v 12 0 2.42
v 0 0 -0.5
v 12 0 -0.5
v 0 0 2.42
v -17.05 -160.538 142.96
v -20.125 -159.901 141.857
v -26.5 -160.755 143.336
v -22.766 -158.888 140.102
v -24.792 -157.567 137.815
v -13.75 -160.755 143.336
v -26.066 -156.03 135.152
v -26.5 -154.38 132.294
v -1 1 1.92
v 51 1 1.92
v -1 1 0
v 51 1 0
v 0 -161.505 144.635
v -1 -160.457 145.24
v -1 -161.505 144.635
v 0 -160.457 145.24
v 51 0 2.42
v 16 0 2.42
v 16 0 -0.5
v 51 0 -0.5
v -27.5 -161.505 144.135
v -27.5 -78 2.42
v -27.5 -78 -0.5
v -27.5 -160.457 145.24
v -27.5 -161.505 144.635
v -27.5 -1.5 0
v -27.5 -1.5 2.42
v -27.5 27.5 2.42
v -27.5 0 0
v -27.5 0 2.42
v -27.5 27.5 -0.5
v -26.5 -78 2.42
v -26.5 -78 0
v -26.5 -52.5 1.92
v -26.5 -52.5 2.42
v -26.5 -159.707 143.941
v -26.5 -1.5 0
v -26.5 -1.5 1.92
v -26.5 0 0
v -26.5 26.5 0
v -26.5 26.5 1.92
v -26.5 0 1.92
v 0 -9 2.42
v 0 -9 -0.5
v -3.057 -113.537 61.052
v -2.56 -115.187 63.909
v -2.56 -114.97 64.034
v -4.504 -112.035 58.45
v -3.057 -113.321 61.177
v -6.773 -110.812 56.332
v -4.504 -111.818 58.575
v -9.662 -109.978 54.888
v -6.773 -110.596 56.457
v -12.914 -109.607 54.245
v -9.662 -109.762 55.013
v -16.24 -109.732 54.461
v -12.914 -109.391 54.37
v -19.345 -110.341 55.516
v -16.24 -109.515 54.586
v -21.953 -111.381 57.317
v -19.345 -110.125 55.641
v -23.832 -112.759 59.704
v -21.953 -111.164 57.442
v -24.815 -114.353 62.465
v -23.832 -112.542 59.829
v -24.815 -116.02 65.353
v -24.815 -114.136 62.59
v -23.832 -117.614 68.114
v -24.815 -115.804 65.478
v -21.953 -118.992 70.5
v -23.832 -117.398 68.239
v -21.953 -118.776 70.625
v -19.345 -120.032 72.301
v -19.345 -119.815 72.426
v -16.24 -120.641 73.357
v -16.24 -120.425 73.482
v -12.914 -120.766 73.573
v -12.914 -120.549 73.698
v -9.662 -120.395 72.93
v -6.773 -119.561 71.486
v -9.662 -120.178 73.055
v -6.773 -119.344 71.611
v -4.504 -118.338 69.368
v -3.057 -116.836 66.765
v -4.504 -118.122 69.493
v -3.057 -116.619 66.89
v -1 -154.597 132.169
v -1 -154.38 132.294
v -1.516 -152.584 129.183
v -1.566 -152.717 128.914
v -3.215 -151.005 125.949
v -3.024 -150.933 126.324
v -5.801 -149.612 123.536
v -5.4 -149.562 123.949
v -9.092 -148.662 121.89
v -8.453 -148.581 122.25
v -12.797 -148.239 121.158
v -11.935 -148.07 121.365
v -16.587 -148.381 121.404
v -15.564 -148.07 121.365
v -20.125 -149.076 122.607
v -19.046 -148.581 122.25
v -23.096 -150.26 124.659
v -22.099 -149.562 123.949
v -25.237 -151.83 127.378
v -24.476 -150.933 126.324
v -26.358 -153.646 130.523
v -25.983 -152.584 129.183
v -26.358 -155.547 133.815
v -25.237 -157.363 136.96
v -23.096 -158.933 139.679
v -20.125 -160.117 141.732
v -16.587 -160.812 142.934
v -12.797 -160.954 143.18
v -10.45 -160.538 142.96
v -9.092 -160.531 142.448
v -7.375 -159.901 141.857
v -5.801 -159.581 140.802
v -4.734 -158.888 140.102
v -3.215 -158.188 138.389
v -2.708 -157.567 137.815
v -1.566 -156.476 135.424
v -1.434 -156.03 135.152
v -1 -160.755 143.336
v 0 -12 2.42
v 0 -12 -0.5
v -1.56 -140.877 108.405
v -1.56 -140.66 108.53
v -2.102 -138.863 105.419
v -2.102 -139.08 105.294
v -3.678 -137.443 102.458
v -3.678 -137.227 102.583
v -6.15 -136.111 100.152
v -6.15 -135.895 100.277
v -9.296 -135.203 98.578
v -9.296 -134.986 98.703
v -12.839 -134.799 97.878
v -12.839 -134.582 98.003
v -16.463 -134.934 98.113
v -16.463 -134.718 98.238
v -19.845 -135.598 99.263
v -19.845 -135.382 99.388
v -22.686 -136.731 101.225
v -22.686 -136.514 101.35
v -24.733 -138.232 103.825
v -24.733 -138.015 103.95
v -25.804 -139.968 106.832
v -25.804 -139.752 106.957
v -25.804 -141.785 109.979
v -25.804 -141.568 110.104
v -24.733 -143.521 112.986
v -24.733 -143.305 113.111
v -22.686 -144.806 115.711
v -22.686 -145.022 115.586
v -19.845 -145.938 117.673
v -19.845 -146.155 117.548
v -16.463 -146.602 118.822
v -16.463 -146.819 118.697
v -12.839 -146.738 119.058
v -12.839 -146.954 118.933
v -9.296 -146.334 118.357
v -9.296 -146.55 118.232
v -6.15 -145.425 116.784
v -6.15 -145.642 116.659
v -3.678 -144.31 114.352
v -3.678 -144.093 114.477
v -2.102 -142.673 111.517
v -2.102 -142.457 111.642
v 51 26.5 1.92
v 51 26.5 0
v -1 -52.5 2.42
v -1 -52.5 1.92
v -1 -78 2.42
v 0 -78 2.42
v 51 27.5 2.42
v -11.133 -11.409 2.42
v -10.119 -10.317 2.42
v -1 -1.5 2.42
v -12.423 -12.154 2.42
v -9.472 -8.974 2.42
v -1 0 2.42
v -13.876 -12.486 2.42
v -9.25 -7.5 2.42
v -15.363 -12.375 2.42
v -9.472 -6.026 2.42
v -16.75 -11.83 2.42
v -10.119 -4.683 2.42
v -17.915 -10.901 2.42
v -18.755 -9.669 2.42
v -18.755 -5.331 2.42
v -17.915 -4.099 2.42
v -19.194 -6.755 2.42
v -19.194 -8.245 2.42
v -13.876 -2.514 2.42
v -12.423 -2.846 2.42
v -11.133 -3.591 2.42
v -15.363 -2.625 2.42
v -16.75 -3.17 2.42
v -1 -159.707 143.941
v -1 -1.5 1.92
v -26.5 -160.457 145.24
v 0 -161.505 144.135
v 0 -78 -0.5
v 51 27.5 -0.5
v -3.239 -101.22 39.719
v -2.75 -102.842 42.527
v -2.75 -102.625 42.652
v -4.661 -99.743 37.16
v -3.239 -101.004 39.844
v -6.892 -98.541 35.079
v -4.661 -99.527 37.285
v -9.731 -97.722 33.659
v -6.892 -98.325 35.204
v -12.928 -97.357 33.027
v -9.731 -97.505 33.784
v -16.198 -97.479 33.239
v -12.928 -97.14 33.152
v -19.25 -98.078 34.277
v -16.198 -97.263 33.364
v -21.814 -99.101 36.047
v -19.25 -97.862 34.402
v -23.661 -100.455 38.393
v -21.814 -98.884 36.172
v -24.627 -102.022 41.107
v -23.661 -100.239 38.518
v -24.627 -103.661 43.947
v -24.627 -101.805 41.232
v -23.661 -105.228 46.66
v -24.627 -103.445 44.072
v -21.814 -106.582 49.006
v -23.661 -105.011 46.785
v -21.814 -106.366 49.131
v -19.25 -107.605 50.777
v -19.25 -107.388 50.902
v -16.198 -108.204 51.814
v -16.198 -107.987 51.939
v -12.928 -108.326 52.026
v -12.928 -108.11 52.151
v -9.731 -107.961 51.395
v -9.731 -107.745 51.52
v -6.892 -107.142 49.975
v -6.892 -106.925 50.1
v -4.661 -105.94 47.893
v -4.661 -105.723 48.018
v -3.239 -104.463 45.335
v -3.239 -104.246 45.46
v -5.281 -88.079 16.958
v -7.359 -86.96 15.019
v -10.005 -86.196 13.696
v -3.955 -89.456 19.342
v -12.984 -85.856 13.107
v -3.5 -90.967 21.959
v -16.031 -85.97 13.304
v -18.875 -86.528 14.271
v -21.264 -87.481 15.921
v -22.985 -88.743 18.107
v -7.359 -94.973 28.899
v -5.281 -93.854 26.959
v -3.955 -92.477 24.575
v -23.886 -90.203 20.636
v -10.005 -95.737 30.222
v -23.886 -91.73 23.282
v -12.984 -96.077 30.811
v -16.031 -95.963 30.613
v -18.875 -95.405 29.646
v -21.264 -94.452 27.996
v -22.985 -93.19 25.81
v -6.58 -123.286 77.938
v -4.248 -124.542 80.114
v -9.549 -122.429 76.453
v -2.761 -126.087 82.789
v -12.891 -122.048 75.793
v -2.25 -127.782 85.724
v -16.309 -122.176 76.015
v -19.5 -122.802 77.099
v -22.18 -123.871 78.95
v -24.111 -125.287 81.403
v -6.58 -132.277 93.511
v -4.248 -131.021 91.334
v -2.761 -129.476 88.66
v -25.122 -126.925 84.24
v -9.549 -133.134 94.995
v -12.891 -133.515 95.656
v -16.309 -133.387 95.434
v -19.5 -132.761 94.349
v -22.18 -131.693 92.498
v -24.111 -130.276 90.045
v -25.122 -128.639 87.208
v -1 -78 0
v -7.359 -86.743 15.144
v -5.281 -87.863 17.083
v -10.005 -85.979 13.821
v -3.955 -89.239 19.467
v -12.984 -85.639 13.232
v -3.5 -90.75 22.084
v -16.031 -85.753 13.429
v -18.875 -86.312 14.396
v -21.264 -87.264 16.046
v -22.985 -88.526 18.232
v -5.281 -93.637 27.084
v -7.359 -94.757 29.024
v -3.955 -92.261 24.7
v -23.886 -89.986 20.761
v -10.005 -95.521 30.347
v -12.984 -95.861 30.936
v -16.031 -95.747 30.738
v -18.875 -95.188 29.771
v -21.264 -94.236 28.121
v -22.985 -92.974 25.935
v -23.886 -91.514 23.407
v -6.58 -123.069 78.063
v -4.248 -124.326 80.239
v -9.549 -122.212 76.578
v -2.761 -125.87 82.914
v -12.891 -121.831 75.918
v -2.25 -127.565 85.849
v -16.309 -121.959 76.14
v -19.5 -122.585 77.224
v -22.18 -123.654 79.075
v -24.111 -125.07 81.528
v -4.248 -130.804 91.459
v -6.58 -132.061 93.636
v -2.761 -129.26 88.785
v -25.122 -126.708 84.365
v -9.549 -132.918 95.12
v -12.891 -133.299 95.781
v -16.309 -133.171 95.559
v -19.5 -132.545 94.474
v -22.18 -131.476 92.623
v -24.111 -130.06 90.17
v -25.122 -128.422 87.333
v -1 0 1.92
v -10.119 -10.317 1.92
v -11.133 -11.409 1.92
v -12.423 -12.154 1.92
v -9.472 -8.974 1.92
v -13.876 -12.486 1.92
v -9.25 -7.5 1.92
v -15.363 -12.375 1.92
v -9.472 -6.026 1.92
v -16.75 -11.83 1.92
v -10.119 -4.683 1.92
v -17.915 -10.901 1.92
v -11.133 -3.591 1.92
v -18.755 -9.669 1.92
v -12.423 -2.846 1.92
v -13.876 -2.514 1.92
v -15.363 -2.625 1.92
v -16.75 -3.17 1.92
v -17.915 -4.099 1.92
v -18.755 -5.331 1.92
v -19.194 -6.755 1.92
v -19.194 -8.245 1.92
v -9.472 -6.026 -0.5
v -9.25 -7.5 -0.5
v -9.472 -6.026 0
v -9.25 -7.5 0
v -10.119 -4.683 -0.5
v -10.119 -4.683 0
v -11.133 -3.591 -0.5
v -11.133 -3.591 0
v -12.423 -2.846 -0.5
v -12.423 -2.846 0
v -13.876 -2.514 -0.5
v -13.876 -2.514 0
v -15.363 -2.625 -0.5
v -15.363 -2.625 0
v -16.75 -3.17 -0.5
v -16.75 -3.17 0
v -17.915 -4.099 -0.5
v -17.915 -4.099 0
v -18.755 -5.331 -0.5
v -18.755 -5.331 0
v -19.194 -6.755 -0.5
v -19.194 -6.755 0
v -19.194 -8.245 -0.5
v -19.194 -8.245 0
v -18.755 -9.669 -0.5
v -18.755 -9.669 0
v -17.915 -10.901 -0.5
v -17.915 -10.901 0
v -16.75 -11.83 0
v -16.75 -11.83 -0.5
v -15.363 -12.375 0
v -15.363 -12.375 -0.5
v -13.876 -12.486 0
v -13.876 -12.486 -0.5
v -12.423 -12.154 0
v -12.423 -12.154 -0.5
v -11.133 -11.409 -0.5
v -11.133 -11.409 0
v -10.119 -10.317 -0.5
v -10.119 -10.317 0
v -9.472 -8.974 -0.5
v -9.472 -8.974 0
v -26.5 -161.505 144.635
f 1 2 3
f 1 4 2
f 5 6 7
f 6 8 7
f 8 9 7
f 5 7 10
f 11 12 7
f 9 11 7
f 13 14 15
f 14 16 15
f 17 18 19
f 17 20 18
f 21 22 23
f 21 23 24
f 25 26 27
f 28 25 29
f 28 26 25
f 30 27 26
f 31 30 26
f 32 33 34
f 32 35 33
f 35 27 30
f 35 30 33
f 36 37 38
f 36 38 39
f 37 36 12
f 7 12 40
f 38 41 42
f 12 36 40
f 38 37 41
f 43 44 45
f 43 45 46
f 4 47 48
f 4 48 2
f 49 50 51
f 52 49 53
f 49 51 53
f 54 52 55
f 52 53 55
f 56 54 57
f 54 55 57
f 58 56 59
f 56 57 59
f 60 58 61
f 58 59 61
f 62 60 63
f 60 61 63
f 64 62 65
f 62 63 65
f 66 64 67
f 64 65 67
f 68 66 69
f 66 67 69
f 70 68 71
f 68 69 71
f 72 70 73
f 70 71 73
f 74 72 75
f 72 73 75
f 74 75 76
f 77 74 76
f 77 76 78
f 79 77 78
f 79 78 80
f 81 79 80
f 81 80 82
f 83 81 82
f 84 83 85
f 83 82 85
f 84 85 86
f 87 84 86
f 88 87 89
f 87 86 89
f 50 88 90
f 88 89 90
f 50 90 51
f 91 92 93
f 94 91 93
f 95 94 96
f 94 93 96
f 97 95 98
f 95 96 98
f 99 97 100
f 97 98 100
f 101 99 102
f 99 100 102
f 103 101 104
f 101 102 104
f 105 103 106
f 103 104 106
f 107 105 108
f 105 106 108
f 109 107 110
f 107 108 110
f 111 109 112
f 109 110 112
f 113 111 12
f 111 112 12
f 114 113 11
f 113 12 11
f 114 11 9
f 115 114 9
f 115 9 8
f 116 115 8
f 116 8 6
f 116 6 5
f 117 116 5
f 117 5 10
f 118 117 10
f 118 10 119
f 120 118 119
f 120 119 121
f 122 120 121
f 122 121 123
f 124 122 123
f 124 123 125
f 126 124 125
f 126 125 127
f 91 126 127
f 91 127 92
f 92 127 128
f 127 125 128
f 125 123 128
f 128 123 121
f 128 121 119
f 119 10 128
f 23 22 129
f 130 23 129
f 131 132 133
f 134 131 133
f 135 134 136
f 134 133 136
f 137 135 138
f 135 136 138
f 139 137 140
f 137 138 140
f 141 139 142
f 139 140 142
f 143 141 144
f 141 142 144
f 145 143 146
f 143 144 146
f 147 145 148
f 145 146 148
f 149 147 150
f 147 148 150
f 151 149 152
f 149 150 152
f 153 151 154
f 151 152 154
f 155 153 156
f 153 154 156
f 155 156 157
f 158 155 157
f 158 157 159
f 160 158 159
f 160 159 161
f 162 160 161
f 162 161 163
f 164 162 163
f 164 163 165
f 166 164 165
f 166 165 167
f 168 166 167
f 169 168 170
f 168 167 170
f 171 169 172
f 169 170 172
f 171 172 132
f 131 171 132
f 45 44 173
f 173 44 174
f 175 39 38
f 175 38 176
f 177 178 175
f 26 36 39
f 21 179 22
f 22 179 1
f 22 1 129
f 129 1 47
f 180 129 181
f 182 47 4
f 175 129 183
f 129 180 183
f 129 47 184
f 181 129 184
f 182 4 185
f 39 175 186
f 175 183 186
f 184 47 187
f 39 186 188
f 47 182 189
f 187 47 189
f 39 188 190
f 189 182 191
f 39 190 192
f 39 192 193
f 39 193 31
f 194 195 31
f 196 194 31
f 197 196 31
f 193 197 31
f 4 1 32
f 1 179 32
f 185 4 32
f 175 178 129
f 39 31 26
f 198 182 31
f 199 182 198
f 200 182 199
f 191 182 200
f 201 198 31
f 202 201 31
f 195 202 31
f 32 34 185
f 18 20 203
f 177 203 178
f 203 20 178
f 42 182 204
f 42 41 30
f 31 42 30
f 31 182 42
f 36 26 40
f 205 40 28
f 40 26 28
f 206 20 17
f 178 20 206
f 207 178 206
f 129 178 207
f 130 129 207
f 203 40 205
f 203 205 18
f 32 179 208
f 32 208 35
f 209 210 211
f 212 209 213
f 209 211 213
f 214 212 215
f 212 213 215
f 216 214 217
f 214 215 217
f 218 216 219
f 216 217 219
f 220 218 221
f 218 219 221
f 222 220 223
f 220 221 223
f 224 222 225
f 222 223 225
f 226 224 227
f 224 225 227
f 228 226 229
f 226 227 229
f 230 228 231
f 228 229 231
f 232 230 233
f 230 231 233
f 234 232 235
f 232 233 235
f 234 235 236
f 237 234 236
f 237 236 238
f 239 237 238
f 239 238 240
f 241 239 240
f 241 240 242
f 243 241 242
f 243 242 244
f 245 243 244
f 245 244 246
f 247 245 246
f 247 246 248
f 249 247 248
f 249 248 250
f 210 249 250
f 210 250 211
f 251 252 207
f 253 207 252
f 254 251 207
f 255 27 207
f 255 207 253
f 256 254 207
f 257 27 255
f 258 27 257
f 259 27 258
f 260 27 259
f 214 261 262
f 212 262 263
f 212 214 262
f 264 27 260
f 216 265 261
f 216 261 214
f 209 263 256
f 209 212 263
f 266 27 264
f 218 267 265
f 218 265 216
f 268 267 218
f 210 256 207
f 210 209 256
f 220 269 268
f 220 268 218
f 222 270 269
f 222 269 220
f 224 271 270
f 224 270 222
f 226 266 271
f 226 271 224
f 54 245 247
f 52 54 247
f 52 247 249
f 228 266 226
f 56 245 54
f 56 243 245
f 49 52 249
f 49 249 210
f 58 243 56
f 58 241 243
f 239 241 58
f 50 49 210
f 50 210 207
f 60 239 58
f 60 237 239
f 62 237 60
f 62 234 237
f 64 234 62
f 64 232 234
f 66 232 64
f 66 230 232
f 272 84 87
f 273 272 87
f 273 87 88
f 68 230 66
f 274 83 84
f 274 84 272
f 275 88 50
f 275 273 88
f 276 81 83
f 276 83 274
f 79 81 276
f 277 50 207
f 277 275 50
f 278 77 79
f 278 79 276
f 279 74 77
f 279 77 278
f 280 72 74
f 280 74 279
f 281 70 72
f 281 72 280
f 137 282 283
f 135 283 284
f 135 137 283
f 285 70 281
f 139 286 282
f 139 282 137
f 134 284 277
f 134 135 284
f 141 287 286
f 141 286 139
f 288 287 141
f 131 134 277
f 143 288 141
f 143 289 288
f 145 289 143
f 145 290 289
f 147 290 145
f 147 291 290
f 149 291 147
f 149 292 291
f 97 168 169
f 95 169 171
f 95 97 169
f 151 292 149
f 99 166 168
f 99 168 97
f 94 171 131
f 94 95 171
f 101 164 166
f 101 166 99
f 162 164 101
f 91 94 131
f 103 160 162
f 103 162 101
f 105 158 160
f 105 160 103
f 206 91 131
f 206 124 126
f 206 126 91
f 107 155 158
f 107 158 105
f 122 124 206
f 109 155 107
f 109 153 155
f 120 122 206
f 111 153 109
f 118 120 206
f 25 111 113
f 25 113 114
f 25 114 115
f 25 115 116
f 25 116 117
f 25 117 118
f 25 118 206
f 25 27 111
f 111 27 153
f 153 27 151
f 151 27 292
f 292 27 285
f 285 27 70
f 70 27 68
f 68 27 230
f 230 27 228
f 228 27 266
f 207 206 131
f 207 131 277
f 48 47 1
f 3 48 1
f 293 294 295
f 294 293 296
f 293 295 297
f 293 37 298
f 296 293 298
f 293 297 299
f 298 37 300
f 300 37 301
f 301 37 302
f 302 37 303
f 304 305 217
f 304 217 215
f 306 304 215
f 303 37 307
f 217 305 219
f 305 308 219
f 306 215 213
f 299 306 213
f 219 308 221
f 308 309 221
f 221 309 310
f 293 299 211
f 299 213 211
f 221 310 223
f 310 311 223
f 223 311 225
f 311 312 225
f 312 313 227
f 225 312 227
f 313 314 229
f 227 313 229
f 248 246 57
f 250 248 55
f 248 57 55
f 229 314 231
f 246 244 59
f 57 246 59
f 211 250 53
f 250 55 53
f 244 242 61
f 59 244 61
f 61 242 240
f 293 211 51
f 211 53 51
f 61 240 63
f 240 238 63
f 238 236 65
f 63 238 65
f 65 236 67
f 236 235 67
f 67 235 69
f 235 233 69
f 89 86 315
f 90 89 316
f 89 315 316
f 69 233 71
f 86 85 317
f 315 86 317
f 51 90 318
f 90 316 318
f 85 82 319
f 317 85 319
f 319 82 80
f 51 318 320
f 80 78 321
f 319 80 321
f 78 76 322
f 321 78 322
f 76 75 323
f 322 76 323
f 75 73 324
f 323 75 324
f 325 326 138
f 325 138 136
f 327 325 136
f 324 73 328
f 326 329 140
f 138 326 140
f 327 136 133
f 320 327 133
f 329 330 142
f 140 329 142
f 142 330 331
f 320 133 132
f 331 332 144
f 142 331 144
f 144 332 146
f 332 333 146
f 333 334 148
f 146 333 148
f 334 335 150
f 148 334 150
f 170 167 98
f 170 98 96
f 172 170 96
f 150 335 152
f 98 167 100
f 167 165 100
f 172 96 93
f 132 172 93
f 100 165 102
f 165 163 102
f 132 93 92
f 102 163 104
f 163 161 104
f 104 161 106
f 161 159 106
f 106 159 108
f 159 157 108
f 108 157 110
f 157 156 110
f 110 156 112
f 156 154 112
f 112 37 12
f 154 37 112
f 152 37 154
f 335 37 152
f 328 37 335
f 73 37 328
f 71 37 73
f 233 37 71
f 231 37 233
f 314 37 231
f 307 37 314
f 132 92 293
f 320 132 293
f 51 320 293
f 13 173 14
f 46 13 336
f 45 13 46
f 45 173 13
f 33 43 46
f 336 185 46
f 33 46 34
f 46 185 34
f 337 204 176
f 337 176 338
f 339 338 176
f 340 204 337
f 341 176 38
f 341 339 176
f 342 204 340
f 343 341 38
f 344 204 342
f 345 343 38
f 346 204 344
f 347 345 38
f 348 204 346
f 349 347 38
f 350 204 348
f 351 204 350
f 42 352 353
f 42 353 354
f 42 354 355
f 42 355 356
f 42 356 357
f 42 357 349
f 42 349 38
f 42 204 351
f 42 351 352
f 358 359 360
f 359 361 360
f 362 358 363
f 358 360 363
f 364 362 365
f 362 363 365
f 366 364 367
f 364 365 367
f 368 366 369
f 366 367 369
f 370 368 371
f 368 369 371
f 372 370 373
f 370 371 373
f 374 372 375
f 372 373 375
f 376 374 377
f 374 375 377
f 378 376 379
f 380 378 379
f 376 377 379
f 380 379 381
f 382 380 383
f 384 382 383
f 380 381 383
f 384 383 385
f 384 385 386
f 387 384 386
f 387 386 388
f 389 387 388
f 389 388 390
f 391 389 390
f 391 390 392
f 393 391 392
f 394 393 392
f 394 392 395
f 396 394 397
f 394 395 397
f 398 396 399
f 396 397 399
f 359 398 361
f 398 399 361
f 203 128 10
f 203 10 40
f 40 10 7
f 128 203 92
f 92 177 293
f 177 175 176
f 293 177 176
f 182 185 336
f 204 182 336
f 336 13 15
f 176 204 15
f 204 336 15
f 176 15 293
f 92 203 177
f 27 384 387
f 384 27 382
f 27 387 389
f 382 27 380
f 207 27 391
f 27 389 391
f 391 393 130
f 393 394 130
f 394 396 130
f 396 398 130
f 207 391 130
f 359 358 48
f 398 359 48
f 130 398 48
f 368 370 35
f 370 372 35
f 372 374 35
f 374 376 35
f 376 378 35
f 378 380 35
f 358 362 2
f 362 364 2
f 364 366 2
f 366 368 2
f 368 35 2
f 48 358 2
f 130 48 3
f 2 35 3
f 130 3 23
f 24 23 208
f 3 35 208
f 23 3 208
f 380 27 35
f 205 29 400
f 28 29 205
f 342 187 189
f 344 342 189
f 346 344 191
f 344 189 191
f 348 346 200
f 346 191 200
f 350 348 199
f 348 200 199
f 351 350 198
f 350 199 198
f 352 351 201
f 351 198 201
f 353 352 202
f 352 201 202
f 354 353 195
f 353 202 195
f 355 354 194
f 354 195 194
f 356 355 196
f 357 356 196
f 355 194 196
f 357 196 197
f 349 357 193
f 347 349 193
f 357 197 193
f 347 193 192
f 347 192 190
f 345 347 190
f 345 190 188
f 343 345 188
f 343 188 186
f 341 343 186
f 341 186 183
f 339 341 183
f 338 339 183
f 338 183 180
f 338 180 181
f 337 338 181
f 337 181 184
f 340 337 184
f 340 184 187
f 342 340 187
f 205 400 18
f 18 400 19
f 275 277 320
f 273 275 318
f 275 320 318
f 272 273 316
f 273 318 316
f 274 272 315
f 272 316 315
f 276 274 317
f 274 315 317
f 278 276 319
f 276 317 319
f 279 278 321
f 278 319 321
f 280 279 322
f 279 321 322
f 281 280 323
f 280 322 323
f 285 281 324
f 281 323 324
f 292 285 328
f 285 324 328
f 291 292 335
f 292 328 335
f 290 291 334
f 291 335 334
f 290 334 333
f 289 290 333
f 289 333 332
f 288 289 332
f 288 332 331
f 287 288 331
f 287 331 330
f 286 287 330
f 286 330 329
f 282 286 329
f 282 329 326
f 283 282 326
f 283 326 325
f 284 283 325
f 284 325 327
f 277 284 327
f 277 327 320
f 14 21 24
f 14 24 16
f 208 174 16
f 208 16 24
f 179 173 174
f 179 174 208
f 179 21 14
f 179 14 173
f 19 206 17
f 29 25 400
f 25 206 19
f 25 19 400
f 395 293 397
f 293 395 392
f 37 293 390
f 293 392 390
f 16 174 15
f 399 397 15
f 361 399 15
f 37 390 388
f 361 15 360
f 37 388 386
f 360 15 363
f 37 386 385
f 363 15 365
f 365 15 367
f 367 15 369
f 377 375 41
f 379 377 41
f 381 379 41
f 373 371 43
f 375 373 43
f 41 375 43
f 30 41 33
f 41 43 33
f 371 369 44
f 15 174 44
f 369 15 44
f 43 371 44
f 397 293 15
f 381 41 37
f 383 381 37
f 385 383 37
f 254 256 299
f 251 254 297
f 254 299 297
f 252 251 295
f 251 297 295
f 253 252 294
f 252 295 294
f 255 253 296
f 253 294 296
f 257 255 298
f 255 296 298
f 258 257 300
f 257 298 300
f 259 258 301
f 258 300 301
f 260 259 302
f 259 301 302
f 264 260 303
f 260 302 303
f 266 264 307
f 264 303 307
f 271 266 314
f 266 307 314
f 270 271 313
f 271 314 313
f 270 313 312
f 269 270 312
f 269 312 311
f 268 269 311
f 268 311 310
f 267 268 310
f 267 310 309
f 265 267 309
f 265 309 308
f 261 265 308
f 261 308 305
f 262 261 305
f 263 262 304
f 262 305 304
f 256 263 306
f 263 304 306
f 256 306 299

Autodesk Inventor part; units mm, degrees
ref_plane "YZ Plane" through (0, 0, 0) normal (1, 0, 0) x (0, 1, 0)
sketch "Boceto1" plane through (0, 0, 0) normal (0, 0, 1) x (1, 0, 0)
  line L0 (0, 0) -> (51, 0)
  line L1 (51, 0) -> (51, 27.5)
  line L2 (51, 27.5) -> (0, 27.5)
  line L3 (-0.5, 1) -> (51, 1)
  line L4 (0, 26.5) -> (51, 26.5)
  line L5 (0, 27.5) -> (-27.5, 27.5)
  line L6 (-27.5, 27.5) -> (-27.5, -52.5)
  line L7 (-27.5, -52.5) -> (0, -52.5)
  line L8 (0, -52.5) -> (0, 0)
  line L9 (0, 26.5) -> (-26.5, 26.5)
  line L10 (-0.5, 1) -> (-1, 1)
  line L11 (-1, 1) -> (-1, -52.5)
  line L12 (-26.5, 26.5) -> (-26.5, -52.5)
  dimension "d0" = 51
  dimension "d1" = 27.5
  dimension "d2" = 1
  dimension "d3" = 1
  dimension "d4" = 27.5
  dimension "d5" = 0.5
  dimension "d6" = 1
  dimension "d7" = 1
  dimension "d8" = 80
extrude "Extrusión1" add sketch "Boceto1" against normal blind 0.5
extrude "Extrusión2" add sketch "Boceto1" along normal blind 0.96 contours L8 L7 L11 L10 L3 L1 L0 | L4 L9 L12 L7 L6 L5 L2 L1
ref_plane "Plano de trabajo1" through (-26.5, -52.5, 0.96) normal (0, 0, 1) x (0, 1, 0)
mirror "Simetría1" about plane through (-26.5, -52.5, 0.96) normal (0, 0, 1) of "Extrusión1", "Extrusión2"
sketch "Boceto2" plane through (-27.5, 27.5, 2.42) normal (0, 0, 1) x (1, 0, 0)
  line L0 (26.5, -80) -> (26.5, -26.5) projected
  line L1 (78.5, -27.5) -> (27.5, -27.5) projected
  line L2 (26.5, -27.5) -> (0, -27.5)
  line L3 (0, -80) -> (0, 0) projected
  line L4 (27.5, -27.5) -> (27.5, -80) projected
  line L5 (26.5, -29) -> (0, -29)
  line L6 (0, -29) -> (0, -27.5)
  line L7 (26.5, -29) -> (26.5, -27.5)
  line L8 (26.5, -80) -> (26.5, -26.5) projected
  line L9 (27.5, -27.5) -> (39.5, -27.5)
  line L10 (27.5, -27.5) -> (27.5, -36.5)
  line L11 (27.5, -36.5) -> (39.5, -27.5)
  line L12 (39.5, -27.5) -> (43.5, -27.5)
  line L13 (43.5, -27.5) -> (27.5, -39.5)
  line L14 (27.5, -39.5) -> (27.5, -36.5)
  circle A0 centre (13.25, -35) radius 5
  dimension "d13" = 1.5
  dimension "d16" = 12
  dimension "d17" = 9
  dimension "d18" = 4
  dimension "d19" = 20
  dimension "d59" = 10
  dimension "d61" = 6
extrude "Extrusión3" cut sketch "Boceto2" against normal blind 2.42 contours L5 L3 L2 L0
extrude "Extrusión4" add sketch "Boceto2" against normal blind 2.92 contours L13 L4 L11 L1
sketch "Boceto3" plane through (-27.5, -52.5, -0.5) normal (0, -1, 0) x (1, 0, 0)
  line L0 (0, 0) -> (78.5, 0) projected
  line L1 (78.5, 0.5) -> (1, 0.5) projected
  line L2 (39.5, 2.92) -> (27.5, 2.92) projected
  line L3 (0, 2.92) -> (0, 0)
  line L4 (27.5, 0) -> (27.5, 2.92) projected
  line L5 (0, 0) -> (27.5, 0)
  line L6 (27.5, 0) -> (27.5, 2.92)
  line L7 (0, 2.92) -> (26.5, 2.92) projected
  line L8 (27.5, 2.92) -> (26.5, 2.92)
  line L9 (26.5, 0.5) -> (26.5, 2.42) projected
  line L10 (26.5, 2.92) -> (26.5, 0.5)
  line L11 (26.5, 0.5) -> (1, 0.5)
  line L12 (1, 0.5) -> (1, 2.42) projected
  line L13 (1, 0.5) -> (1, 2.92)
  line L14 (1, 2.92) -> (0, 2.92)
extrude "Extrusión5" add sketch "Boceto3" along normal blind 25.5 contours L3 L7 L13 L12 L1 L4 L0 | L1 L9 L10 L8 L4
sketch "Boceto4" plane through (-27.5, 27.5, -0.5) normal (-1, 0, 0) x (0, 0, 1)
  line L0 (2.92, -105.5) -> (0, -105.5) projected
  line L1 (0.5, -29) -> (0.5, -105.5) projected
  line L2 (0, 0) -> (0, -105.5) projected
  line L3 (0.5, -105.5) -> (0, -105.5)
  line L4 (0, -39.5) -> (0, -105.5) projected
  line L5 (0, -105.5) -> (144.6349, -189.005)
  line L6 (2.92, -105.5) -> (0.5, -105.5) projected
  line L7 (0.5, -105.5) -> (145.1349, -189.005)
  line L8 (2.92, -39.5) -> (2.92, -105.5) projected
  line L9 (0.5, -105.5) -> (2.92, -105.5)
  line L10 (2.92, -105.5) -> (145.7399, -187.9571)
  line L11 (144.6349, -189.005) -> (145.1349, -189.005)
  line L12 (145.1349, -189.005) -> (145.7399, -187.9571)
  point P0 (0.5, -27.5)
  dimension "d26" = 30
extrude "Extrusión6" add sketch "Boceto4" against normal blind 27.5 contours L7 L11 L5 L0
ref_plane "Plano de trabajo2" through (-13.75, 27.5, -0.5) normal (-1, 0, 0) x (0, 0, 1)
extrude "Extrusión7" add sketch "Boceto4" against normal blind 1 contours L10 L12 L7 L0
mirror "Simetría2" about plane through (-13.75, 27.5, -0.5) normal (-1, 0, 0) of "Extrusión7"
sketch "Boceto5" plane through (-26.5, -78, 0) normal (0, 0.866, 0.5) x (1, 0, 0)
  line L0 (0, 0) -> (0, -167.01) projected
  line L1 (25.5, -167.01) -> (25.5, 0) projected
  line L2 (25.5, 0) -> (0, 0) projected
  line L3 (0, 0) -> (0, -167.01) projected
  line L4 (0, -167.01) -> (25.5, -167.01) projected
  line L5 (12.75, 0) -> (38.25, 0) construction
  circle A0 centre (12.75, -25.5) radius 10.25
  line L6 (12.75, -35.75) -> (12.75, -38.25)
  circle A1 centre (12.75, -49.25) radius 11
  line L7 (12.75, -38.25) -> (23.75, -38.25) construction
  line L8 (12.75, -60.25) -> (12.75, -62.75)
  circle A2 centre (12.75, -73.94) radius 11.19
  line L9 (12.75, -85.13) -> (12.75, -87.63)
  circle A3 centre (12.75, -99.13) radius 11.5
  line L10 (12.75, -110.63) -> (12.75, -113.13)
  circle A4 centre (12.75, -125.32) radius 12.19
  line L11 (12.75, -113.13) -> (24.94, -113.13) construction
  line L12 (12.75, -137.51) -> (12.75, -140.01)
  circle A5 centre (12.75, -152.76) radius 12.75
  line L13 (12.75, -15.25) -> (12.75, 0)
  line L14 (0, -167.01) -> (25.5, -167.01) projected
  line L15 (25.5, -167.01) -> (25.5, 0) projected
  line L16 (0, -167.01) -> (25.5, -167.01)
  line L17 (25.5, -167.01) -> (25.5, -165.51)
  line L18 (25.5, -165.51) -> (0, -165.51)
  line L19 (0, -165.51) -> (0, -167.01)
  point P0 (26.5, 39)
  dimension "d37" = 22
  dimension "d41" = 22.38
  dimension "d45" = 23
  dimension "d48" = 24.38
  dimension "d35" = 20.5
  dimension "d36" = 2.5
  dimension "d40" = 2.5
  dimension "d44" = 2.5
  dimension "d47" = 2.5
  dimension "d51" = 2.5
  dimension "d53" = 25.5
extrude "Extrusión8" cut sketch "Boceto5" against normal through all contours A5 | A4 | A0 | A3 | A1 | A2
extrude "Extrusión9" add sketch "Boceto5" along normal blind 1.21 contours L18 L1 L4 L0
extrude "Extrusión10" cut sketch "Boceto2" against normal through all contours A0
equation "\"d59\" = sensor"
equation "\"d37\" = cincuentacen"
equation "\"d41\" = dossol"
equation "\"d45\" = veintecen"
equation "\"d48\" = cincosol"
equation "\"d35\" = diezcen"
equation "\"d53\" = UnSol"
equation "\"UnSol\" = 25.5"
equation "\"diezcen\" = 20.5"
equation "\"veintecen\" = 23"
equation "\"cincuentacen\" = 22"
equation "\"dossol\" = 22.38"
equation "\"cincosol\" = 24.38"
equation "\"sensor\" = 10"
properties part number "Maquinita"
